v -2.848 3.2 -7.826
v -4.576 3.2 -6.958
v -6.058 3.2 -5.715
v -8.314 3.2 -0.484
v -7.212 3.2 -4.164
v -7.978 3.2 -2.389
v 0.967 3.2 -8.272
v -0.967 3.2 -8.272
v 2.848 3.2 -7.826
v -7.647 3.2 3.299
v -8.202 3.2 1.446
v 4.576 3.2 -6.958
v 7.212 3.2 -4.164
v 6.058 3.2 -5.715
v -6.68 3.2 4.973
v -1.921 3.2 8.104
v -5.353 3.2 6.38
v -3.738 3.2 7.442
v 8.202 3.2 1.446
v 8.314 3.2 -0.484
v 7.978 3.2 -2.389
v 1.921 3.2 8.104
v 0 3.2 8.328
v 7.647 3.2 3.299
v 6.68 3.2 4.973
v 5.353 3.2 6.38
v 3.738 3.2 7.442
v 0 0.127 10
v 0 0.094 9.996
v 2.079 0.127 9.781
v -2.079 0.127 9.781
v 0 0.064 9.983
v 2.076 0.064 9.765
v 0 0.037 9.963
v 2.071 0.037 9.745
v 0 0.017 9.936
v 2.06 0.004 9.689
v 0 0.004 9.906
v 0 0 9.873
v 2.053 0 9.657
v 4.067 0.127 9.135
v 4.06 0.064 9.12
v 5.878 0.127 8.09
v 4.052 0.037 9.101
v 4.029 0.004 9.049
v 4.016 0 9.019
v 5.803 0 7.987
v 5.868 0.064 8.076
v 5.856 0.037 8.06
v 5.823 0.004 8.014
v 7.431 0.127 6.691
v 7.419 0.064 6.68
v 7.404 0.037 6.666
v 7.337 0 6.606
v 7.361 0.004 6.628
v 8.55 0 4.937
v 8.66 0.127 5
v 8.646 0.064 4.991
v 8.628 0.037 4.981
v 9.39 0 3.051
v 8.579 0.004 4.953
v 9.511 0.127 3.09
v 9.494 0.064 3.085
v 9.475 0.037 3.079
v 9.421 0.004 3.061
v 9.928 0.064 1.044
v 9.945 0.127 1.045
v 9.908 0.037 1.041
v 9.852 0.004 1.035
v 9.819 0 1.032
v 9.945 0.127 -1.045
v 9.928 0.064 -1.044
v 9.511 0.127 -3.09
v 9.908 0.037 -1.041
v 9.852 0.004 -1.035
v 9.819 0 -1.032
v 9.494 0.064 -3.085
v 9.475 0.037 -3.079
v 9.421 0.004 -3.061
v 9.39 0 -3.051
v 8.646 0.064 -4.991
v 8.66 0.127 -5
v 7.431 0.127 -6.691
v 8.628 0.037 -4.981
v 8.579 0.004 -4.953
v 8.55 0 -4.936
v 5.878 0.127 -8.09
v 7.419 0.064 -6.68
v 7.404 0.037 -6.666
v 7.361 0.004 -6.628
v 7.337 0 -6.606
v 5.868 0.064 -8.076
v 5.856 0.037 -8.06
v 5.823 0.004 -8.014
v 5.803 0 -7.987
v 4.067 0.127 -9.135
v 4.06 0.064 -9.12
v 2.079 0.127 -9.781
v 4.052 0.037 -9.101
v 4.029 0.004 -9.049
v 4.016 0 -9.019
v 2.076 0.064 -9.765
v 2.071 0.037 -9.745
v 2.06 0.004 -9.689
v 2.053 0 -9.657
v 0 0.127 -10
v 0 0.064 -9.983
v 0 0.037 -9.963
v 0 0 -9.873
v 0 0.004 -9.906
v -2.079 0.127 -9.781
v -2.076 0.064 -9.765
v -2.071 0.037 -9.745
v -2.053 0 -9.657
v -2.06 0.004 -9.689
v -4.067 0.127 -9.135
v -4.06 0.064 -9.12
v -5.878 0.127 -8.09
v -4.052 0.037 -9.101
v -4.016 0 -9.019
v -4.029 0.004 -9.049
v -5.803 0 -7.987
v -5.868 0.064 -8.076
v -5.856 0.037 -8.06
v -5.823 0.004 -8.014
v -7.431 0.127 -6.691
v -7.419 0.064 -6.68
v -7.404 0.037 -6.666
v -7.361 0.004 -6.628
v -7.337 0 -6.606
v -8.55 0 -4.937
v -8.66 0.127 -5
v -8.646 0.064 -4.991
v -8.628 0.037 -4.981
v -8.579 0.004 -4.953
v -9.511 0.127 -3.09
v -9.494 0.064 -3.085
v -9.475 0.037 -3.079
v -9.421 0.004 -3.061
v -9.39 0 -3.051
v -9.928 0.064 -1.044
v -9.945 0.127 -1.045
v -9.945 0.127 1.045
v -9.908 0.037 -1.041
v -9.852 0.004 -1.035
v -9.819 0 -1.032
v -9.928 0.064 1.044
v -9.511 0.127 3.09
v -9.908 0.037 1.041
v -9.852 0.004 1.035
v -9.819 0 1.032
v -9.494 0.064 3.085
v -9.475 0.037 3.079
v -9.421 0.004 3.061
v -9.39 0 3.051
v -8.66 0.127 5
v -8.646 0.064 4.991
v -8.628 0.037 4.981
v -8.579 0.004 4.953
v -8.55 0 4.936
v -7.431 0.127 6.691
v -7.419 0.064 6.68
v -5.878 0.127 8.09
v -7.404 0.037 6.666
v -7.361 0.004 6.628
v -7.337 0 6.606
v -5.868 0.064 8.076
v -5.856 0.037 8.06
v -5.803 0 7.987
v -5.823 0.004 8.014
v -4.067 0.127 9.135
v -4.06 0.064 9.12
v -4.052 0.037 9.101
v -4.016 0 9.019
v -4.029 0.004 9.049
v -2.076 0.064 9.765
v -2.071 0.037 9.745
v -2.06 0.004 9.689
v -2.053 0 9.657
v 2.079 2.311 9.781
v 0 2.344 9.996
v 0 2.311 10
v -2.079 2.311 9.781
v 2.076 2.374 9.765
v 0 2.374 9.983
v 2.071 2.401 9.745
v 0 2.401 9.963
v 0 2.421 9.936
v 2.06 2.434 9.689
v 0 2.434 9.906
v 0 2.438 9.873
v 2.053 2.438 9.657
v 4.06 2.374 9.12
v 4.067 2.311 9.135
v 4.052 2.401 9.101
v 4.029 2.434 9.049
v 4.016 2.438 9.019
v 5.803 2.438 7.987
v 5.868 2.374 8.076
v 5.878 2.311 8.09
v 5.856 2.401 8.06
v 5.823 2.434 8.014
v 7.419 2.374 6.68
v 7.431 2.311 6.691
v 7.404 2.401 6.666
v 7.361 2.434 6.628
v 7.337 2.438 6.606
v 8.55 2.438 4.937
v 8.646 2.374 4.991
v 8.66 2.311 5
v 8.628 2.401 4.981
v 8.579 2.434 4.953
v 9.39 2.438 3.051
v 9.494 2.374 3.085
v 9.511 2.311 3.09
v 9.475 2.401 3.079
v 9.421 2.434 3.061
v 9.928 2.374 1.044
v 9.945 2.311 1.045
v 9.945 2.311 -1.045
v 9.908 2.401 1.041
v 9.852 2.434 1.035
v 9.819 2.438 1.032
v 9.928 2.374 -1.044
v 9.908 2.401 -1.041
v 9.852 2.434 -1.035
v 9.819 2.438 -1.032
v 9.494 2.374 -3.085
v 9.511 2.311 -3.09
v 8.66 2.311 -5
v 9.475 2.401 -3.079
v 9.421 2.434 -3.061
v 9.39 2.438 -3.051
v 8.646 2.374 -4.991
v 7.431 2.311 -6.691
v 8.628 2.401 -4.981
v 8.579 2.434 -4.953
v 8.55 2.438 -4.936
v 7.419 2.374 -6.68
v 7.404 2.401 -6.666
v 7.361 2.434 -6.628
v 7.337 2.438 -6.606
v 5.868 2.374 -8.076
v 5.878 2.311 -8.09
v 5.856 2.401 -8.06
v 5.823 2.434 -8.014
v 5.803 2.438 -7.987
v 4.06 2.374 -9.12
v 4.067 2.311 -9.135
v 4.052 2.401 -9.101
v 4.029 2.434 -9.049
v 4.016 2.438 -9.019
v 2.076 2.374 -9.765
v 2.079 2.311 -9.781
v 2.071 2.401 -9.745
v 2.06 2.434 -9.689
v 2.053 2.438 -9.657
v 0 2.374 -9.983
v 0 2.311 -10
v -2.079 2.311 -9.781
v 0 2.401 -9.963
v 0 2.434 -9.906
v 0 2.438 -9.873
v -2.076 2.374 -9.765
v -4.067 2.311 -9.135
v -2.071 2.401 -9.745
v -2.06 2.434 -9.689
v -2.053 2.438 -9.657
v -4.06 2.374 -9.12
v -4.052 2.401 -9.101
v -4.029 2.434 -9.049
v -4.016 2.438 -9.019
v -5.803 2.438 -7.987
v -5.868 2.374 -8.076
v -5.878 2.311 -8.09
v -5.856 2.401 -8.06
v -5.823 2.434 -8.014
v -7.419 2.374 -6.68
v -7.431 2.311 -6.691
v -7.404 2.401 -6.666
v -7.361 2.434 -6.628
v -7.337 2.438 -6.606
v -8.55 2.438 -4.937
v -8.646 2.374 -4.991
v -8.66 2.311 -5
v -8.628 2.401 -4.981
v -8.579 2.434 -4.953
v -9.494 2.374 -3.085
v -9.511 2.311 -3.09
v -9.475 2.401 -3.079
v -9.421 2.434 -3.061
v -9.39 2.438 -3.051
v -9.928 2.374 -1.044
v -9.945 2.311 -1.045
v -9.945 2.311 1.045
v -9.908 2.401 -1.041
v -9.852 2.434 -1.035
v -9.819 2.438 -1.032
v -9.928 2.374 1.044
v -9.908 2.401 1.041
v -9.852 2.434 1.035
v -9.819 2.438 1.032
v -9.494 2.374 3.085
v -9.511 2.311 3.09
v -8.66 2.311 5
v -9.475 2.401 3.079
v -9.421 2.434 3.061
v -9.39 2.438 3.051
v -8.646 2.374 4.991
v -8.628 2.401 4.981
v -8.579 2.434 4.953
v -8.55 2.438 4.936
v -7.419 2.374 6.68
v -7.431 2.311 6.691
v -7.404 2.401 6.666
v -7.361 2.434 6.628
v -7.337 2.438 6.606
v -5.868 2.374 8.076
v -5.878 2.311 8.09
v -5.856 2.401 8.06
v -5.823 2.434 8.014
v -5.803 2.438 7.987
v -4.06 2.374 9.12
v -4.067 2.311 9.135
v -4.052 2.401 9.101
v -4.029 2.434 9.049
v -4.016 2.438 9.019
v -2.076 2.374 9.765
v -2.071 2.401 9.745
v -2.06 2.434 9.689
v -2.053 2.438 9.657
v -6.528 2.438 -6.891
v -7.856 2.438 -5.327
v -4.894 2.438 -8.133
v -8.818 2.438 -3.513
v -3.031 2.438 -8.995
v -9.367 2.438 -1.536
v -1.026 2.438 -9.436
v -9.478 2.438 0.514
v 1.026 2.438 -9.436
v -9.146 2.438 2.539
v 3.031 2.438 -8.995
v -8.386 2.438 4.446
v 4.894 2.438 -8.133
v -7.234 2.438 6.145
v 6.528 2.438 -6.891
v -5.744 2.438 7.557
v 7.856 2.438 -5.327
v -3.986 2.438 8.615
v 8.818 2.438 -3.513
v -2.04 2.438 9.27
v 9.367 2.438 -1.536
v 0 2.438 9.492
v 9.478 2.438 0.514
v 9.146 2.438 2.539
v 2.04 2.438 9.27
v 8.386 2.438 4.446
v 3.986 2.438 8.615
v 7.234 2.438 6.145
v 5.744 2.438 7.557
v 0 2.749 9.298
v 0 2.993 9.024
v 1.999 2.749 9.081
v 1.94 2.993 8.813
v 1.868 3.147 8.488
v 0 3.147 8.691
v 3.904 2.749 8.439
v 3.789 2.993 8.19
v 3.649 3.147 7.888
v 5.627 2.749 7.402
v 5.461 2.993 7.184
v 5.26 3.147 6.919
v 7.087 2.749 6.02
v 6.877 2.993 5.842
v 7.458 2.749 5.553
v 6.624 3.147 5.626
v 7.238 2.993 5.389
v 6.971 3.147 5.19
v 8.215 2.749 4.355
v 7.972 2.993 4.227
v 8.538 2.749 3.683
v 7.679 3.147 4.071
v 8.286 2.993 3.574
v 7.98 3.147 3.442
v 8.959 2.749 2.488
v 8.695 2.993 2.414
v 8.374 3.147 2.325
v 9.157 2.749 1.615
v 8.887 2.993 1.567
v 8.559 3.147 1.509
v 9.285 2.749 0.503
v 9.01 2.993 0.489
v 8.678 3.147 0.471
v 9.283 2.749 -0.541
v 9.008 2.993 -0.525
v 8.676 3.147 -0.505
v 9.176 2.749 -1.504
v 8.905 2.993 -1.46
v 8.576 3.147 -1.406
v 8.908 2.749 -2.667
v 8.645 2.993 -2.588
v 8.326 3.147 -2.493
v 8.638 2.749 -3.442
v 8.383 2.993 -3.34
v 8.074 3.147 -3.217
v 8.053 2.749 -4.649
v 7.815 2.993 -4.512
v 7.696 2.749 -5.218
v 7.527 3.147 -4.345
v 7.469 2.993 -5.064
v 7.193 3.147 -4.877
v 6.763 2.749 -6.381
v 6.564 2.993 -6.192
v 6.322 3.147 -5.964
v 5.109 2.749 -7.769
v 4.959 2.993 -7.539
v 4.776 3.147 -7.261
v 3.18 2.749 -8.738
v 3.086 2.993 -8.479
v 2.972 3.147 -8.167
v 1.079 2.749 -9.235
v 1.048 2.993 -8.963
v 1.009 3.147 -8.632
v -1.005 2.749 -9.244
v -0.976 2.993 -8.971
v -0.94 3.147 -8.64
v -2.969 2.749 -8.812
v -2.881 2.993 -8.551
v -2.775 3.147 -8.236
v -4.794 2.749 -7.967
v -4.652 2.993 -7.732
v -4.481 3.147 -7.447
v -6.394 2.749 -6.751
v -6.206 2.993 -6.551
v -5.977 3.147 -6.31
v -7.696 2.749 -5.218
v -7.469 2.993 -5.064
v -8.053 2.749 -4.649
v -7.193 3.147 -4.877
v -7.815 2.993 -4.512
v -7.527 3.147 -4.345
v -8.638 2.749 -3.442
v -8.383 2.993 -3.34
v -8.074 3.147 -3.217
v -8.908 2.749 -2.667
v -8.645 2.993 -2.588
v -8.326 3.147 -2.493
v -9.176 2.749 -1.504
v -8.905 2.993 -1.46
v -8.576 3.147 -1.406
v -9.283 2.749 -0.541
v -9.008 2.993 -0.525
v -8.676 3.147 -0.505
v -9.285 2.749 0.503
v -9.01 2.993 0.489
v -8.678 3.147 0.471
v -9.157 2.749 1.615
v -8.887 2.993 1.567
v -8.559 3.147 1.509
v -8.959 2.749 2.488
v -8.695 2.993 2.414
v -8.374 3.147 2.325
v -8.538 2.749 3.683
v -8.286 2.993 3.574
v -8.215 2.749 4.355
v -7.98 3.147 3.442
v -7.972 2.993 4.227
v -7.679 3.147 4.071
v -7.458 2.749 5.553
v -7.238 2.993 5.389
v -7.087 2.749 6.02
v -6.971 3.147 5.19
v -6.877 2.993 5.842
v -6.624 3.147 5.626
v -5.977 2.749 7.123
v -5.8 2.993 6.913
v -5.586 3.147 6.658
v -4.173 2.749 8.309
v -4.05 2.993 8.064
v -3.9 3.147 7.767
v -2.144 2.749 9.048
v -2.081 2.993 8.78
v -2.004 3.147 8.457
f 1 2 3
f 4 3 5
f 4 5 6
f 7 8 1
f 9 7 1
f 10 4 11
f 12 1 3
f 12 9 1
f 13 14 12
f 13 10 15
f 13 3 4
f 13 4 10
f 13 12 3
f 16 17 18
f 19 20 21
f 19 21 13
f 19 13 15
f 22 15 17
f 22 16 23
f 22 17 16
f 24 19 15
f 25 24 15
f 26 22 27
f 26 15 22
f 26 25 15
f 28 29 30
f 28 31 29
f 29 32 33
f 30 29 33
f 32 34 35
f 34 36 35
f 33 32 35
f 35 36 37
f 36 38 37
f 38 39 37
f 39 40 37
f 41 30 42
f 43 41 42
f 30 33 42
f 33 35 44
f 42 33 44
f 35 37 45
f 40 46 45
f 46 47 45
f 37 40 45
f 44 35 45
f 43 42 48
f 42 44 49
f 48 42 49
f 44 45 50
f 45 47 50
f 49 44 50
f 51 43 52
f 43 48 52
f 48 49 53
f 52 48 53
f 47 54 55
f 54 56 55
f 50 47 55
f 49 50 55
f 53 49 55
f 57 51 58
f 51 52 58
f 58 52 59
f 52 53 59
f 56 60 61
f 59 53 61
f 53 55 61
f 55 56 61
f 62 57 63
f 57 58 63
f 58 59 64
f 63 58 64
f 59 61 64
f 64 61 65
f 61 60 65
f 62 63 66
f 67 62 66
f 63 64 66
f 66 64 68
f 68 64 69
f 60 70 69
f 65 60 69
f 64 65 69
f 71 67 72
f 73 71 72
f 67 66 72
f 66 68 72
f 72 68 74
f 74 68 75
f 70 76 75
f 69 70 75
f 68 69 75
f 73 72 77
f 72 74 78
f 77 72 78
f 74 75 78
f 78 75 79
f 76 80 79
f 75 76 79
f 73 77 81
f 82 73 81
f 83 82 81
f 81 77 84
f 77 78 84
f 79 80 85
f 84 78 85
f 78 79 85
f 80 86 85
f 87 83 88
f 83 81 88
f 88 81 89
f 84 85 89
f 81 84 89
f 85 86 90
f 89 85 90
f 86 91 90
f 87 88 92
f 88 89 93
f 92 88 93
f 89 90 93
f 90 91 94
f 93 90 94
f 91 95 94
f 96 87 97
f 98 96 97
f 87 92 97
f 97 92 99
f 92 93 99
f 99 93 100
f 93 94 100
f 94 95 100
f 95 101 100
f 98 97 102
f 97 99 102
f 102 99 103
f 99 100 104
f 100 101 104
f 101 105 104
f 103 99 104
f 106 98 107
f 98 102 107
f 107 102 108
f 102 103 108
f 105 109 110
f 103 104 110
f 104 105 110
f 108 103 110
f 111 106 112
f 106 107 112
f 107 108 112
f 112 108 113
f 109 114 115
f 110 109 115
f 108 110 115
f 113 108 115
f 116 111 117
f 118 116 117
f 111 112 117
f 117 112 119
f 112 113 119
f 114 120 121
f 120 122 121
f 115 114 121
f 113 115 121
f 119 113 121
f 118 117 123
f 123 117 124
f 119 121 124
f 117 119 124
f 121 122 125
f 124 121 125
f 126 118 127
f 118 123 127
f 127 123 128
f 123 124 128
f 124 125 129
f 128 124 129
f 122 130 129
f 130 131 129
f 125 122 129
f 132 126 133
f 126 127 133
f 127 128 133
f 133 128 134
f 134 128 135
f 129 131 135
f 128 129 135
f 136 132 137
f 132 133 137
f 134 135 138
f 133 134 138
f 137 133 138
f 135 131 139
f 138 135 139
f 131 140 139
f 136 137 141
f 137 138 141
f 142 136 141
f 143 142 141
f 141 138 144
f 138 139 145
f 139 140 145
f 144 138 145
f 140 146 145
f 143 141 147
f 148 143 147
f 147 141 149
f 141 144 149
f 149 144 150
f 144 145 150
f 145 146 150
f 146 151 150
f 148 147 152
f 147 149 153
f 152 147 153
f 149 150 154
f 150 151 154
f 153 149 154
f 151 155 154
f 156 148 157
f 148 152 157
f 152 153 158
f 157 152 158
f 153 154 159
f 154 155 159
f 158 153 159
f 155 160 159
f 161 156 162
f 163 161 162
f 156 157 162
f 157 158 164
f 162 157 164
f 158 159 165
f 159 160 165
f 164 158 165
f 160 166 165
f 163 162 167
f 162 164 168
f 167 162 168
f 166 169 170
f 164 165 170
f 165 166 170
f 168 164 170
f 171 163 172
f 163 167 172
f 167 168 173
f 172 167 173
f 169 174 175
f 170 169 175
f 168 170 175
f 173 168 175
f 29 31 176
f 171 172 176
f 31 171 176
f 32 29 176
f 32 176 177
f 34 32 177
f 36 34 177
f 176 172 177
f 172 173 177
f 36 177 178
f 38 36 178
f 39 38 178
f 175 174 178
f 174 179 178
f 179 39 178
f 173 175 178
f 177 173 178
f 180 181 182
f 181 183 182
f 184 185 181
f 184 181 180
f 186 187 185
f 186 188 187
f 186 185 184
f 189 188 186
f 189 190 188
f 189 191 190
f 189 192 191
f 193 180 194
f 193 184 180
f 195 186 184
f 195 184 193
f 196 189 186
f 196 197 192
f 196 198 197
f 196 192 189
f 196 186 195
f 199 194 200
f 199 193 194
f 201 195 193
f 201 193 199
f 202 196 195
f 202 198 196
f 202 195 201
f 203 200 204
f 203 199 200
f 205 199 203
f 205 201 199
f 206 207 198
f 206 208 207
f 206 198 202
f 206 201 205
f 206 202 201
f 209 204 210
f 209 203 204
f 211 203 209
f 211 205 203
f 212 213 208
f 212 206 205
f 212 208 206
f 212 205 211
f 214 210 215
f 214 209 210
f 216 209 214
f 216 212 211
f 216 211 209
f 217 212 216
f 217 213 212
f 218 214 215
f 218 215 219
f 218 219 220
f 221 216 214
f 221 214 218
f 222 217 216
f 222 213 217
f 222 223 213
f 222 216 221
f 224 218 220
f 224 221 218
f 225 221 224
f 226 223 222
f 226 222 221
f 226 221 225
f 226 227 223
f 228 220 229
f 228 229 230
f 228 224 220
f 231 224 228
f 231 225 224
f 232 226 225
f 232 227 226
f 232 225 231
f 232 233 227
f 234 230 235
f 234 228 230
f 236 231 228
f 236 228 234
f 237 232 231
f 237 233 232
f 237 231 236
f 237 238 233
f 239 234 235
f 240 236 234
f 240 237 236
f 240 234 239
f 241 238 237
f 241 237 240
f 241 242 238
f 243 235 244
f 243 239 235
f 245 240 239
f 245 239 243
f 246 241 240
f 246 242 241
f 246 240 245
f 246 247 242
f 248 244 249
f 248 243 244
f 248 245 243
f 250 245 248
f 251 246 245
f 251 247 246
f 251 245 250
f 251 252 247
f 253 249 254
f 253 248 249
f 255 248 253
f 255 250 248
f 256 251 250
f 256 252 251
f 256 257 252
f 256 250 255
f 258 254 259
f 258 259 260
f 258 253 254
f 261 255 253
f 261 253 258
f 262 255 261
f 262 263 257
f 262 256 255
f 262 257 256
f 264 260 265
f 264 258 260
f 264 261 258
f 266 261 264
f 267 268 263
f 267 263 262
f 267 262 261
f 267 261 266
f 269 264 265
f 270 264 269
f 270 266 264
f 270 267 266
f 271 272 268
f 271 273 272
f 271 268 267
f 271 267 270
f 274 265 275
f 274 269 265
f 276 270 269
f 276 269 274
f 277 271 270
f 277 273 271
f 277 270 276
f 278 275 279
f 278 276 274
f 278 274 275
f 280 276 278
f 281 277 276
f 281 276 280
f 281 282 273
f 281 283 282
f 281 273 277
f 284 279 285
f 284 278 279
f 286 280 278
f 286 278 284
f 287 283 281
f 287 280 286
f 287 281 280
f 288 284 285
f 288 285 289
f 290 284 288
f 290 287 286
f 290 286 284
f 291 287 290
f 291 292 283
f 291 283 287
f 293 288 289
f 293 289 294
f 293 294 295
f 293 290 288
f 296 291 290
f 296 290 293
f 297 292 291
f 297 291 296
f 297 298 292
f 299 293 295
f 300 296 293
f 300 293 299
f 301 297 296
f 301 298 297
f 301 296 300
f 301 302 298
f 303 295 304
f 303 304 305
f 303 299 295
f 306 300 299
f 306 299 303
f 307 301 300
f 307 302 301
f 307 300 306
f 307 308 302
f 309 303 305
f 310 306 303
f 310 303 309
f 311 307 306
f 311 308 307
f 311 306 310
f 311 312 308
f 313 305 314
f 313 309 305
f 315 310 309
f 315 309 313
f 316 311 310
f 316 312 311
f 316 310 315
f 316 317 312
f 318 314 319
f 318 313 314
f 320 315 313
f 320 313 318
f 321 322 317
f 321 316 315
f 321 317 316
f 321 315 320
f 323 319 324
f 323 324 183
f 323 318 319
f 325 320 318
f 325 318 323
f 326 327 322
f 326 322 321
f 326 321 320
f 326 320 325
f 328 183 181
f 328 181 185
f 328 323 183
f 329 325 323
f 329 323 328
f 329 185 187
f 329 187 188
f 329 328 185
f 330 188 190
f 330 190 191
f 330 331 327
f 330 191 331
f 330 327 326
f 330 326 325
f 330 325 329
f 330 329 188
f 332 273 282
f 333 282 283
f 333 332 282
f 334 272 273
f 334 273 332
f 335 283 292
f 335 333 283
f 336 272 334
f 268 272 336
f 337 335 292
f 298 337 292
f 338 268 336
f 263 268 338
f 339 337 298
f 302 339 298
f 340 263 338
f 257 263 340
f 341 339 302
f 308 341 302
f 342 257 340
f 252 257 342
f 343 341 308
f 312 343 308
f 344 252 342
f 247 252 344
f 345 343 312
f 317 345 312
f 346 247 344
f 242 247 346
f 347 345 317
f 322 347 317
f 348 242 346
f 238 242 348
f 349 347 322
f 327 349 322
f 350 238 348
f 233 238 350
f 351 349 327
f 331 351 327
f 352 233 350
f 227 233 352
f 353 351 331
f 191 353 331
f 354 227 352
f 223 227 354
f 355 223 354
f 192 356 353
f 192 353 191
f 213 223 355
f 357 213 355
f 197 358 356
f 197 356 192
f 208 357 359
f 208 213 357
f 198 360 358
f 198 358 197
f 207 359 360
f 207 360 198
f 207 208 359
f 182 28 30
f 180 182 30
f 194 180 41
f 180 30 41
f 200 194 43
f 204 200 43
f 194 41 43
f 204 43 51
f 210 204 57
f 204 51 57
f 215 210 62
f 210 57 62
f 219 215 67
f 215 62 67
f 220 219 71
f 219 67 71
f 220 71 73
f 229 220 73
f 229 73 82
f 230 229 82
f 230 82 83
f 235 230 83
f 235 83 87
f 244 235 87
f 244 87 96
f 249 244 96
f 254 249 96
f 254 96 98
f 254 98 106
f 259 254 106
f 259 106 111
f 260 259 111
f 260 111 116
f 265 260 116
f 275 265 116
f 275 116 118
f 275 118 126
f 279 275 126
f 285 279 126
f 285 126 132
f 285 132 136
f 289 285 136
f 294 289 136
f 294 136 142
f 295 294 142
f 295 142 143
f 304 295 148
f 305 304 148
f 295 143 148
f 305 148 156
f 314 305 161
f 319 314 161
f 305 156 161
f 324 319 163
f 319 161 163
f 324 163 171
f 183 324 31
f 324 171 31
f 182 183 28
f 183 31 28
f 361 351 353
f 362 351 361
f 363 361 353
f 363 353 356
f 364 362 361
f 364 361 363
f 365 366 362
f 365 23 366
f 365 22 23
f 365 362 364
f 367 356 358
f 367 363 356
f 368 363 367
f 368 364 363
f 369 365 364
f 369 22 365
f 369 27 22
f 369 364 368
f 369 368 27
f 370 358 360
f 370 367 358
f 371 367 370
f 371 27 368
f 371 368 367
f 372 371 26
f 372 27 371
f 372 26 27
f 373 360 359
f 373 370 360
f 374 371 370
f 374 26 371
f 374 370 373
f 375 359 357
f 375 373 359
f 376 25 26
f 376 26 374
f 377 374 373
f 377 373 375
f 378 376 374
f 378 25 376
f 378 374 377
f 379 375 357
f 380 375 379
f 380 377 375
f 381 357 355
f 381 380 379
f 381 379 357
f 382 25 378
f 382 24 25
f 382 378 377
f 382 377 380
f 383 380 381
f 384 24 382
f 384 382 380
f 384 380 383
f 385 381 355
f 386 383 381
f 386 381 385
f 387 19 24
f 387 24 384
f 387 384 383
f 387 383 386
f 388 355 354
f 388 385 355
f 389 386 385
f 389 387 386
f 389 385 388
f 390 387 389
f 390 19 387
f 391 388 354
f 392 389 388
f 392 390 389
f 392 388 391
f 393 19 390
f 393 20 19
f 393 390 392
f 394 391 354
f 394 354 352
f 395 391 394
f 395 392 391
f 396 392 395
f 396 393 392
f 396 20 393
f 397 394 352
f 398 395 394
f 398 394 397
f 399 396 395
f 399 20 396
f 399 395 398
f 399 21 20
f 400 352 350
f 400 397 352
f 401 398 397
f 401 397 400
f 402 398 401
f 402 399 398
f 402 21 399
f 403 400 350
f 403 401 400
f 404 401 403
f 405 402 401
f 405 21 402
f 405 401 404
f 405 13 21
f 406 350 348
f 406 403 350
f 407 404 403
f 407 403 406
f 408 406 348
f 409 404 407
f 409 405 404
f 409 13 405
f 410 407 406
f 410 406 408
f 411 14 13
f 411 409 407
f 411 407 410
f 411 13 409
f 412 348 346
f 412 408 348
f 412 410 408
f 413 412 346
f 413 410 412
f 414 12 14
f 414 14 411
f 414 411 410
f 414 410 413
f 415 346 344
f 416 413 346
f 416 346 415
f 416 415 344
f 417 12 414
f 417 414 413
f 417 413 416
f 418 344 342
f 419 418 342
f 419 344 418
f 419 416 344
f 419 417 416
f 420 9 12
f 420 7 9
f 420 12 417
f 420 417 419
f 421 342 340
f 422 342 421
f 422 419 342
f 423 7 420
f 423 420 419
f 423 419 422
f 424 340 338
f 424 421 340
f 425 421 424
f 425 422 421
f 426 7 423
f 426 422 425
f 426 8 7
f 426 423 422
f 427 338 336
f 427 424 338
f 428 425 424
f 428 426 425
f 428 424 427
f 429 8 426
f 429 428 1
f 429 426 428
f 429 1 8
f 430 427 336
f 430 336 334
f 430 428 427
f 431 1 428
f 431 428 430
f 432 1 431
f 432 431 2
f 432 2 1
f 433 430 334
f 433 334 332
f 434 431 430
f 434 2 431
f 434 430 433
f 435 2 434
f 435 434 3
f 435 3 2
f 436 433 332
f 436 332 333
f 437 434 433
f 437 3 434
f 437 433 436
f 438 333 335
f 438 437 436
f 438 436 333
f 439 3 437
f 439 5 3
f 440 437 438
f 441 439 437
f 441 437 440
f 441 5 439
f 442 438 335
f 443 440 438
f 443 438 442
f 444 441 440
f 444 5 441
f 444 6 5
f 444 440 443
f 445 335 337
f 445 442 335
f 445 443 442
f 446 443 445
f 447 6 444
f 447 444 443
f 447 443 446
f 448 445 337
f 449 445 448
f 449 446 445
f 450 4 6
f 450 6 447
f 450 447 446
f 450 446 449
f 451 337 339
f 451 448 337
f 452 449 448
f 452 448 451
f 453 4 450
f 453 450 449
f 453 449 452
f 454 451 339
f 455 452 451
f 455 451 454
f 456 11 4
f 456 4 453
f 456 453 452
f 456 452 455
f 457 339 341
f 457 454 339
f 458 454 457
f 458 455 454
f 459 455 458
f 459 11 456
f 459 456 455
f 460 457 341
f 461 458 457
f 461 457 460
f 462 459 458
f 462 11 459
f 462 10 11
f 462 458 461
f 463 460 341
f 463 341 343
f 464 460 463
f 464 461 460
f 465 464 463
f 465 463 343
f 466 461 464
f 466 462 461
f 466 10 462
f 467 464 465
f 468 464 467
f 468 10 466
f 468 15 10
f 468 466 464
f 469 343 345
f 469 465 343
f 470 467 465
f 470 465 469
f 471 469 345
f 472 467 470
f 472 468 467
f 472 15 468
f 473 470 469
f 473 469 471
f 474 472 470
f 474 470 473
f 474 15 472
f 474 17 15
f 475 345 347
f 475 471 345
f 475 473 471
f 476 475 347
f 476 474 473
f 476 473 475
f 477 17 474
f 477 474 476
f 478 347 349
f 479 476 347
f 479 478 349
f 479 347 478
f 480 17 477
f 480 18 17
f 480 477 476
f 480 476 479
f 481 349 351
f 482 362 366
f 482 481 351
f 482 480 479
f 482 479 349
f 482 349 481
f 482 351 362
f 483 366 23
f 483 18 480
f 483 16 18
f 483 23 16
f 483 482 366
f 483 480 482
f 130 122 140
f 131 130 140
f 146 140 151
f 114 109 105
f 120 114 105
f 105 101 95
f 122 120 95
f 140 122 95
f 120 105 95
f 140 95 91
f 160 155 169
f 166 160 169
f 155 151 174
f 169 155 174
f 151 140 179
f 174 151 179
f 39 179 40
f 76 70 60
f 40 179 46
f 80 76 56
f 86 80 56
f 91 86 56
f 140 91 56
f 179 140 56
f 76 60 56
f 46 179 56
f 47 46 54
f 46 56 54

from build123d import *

# Parameters (mm, degrees)
SKETCH1_R           = 10
BOSS_EXTRUDE1_DEPTH = 3.2
CUT_EXTRUDE1_START  = -0.762
SKETCH2_R           = 10
SKETCH2_R_2         = 9.492
CUT_EXTRUDE1_DEPTH  = 0.762
FILLET3_R           = 1.27
FILLET2_R           = 0.127


with BuildPart() as part:
    # Sketch1 → Boss-Extrude1 (new body)
    with BuildSketch(Plane(origin=(0, 0, 0), x_dir=(1, 0, 0), z_dir=(0, 1, 0))):
        with Locations(Location((0, 0, 0), (0, 0, 270))):
            Circle(SKETCH1_R)
    extrude(amount=BOSS_EXTRUDE1_DEPTH)

    # Sketch2 → Cut-Extrude1 (cut)
    with BuildSketch(Plane(origin=(0, 3.2, 0), x_dir=(1, 0, 0), z_dir=(0, 1, 0)).offset(CUT_EXTRUDE1_START)):
        with Locations(Location((0, 0, 0), (0, 0, 270))):
            Circle(SKETCH2_R)
        with Locations(Location((0, 0, 0), (0, 0, 270))):
            Circle(SKETCH2_R_2, mode=Mode.SUBTRACT)
    extrude(amount=CUT_EXTRUDE1_DEPTH, mode=Mode.SUBTRACT)

    # Fillet3
    # the kernel refuses this fillet: 1.27 mm, written as the material it takes off along each edge
    with BuildSketch(Plane(origin=(0, 3.2, 0), x_dir=(0, 0, 1), z_dir=(-1, 0, 0))) as fillet3_piece_1:
        with BuildLine():
            CenterArc((8.328025773, -1.27), FILLET3_R, 23.578178478, 66.421821522)
            Line((8.328025773, 0), (8.328025773, 0.0254))
            Line((8.328025773, 0.0254), (9.492, 0.0254))
            Line((9.492, 0.0254), (9.5174, 0))
            ThreePointArc((9.5174, 0), (9.5174, -0.381), (9.515279485, -0.75184))
            Line((9.515279485, -0.75184), (9.492, -0.762))
        make_face()
    revolve(axis=Axis((0, 3.2, 0), (0, 1, 0)), mode=Mode.SUBTRACT)

    # Fillet2
    fillet2_edges = [part.edges().sort_by_distance(p)[0] for p in [
        (0, 0, -10),
        (0, 2.438, -10),
    ]]
    fillet(fillet2_edges, radius=FILLET2_R)


solid = part.part
